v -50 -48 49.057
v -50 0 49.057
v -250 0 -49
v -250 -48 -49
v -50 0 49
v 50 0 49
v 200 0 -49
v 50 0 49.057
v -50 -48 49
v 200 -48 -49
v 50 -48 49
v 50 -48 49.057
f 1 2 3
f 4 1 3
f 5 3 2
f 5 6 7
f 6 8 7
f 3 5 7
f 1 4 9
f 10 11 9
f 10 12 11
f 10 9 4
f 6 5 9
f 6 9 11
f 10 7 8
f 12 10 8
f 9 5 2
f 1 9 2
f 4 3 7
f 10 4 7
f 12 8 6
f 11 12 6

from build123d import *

# Parameters (mm, degrees)
F0_W     = 100
F0_H     = 98
F1_DEPTH = 48


# Not quite as in the source:
# - a feature names something its author has since deleted; it is built from what else it names


with BuildPart() as f1:
    # F0 (on Front) → F1 (new body)
    with BuildSketch(Plane.XZ):
        Rectangle(F0_W, F0_H)
        Polygon((-250, -49), (-50, -49), (-50, 49), (-50, 49.0569584072), align=None)
        Polygon((50, 49), (50, -49), (200, -49), (50, 49.0569546819), align=None)
    extrude(amount=F1_DEPTH)


solid = f1.part
